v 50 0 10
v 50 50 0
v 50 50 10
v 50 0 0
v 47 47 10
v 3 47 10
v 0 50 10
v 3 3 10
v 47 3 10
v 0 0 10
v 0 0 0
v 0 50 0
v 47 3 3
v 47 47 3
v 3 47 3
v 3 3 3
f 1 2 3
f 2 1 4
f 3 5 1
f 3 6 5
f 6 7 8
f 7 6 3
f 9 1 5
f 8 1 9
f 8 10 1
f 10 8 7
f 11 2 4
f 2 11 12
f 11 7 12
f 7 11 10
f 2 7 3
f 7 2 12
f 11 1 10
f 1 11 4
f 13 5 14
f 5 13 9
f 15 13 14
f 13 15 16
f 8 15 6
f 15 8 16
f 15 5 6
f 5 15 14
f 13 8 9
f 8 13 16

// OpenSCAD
// Generated by HEIDI for job job_1787770638843_42372812
// Product: 3D-Printable Model Preparation Package
// Request: Failure injection test
// Model type: box
// Generated: 2026-09-07T04:35:15.532Z
//
// This is a parameterized OpenSCAD model. You can adjust the
// parameters below to customize the dimensions before rendering.

// ─── Parameters ───
width = 50;       // X dimension in mm
height = 50;     // Y dimension in mm
depth = 10;       // Z dimension in mm
wall = 3;    // wall thickness in mm
$fn = 60;               // facet resolution

// Parametric hollow box
module parametric_box() {
    difference() {
        // Outer shell
        cube([width, height, depth]);
        // Inner cavity
        translate([wall, wall, wall])
            cube([width - wall * 2, height - wall * 2, depth - wall + 1]);
    }
}
parametric_box();
